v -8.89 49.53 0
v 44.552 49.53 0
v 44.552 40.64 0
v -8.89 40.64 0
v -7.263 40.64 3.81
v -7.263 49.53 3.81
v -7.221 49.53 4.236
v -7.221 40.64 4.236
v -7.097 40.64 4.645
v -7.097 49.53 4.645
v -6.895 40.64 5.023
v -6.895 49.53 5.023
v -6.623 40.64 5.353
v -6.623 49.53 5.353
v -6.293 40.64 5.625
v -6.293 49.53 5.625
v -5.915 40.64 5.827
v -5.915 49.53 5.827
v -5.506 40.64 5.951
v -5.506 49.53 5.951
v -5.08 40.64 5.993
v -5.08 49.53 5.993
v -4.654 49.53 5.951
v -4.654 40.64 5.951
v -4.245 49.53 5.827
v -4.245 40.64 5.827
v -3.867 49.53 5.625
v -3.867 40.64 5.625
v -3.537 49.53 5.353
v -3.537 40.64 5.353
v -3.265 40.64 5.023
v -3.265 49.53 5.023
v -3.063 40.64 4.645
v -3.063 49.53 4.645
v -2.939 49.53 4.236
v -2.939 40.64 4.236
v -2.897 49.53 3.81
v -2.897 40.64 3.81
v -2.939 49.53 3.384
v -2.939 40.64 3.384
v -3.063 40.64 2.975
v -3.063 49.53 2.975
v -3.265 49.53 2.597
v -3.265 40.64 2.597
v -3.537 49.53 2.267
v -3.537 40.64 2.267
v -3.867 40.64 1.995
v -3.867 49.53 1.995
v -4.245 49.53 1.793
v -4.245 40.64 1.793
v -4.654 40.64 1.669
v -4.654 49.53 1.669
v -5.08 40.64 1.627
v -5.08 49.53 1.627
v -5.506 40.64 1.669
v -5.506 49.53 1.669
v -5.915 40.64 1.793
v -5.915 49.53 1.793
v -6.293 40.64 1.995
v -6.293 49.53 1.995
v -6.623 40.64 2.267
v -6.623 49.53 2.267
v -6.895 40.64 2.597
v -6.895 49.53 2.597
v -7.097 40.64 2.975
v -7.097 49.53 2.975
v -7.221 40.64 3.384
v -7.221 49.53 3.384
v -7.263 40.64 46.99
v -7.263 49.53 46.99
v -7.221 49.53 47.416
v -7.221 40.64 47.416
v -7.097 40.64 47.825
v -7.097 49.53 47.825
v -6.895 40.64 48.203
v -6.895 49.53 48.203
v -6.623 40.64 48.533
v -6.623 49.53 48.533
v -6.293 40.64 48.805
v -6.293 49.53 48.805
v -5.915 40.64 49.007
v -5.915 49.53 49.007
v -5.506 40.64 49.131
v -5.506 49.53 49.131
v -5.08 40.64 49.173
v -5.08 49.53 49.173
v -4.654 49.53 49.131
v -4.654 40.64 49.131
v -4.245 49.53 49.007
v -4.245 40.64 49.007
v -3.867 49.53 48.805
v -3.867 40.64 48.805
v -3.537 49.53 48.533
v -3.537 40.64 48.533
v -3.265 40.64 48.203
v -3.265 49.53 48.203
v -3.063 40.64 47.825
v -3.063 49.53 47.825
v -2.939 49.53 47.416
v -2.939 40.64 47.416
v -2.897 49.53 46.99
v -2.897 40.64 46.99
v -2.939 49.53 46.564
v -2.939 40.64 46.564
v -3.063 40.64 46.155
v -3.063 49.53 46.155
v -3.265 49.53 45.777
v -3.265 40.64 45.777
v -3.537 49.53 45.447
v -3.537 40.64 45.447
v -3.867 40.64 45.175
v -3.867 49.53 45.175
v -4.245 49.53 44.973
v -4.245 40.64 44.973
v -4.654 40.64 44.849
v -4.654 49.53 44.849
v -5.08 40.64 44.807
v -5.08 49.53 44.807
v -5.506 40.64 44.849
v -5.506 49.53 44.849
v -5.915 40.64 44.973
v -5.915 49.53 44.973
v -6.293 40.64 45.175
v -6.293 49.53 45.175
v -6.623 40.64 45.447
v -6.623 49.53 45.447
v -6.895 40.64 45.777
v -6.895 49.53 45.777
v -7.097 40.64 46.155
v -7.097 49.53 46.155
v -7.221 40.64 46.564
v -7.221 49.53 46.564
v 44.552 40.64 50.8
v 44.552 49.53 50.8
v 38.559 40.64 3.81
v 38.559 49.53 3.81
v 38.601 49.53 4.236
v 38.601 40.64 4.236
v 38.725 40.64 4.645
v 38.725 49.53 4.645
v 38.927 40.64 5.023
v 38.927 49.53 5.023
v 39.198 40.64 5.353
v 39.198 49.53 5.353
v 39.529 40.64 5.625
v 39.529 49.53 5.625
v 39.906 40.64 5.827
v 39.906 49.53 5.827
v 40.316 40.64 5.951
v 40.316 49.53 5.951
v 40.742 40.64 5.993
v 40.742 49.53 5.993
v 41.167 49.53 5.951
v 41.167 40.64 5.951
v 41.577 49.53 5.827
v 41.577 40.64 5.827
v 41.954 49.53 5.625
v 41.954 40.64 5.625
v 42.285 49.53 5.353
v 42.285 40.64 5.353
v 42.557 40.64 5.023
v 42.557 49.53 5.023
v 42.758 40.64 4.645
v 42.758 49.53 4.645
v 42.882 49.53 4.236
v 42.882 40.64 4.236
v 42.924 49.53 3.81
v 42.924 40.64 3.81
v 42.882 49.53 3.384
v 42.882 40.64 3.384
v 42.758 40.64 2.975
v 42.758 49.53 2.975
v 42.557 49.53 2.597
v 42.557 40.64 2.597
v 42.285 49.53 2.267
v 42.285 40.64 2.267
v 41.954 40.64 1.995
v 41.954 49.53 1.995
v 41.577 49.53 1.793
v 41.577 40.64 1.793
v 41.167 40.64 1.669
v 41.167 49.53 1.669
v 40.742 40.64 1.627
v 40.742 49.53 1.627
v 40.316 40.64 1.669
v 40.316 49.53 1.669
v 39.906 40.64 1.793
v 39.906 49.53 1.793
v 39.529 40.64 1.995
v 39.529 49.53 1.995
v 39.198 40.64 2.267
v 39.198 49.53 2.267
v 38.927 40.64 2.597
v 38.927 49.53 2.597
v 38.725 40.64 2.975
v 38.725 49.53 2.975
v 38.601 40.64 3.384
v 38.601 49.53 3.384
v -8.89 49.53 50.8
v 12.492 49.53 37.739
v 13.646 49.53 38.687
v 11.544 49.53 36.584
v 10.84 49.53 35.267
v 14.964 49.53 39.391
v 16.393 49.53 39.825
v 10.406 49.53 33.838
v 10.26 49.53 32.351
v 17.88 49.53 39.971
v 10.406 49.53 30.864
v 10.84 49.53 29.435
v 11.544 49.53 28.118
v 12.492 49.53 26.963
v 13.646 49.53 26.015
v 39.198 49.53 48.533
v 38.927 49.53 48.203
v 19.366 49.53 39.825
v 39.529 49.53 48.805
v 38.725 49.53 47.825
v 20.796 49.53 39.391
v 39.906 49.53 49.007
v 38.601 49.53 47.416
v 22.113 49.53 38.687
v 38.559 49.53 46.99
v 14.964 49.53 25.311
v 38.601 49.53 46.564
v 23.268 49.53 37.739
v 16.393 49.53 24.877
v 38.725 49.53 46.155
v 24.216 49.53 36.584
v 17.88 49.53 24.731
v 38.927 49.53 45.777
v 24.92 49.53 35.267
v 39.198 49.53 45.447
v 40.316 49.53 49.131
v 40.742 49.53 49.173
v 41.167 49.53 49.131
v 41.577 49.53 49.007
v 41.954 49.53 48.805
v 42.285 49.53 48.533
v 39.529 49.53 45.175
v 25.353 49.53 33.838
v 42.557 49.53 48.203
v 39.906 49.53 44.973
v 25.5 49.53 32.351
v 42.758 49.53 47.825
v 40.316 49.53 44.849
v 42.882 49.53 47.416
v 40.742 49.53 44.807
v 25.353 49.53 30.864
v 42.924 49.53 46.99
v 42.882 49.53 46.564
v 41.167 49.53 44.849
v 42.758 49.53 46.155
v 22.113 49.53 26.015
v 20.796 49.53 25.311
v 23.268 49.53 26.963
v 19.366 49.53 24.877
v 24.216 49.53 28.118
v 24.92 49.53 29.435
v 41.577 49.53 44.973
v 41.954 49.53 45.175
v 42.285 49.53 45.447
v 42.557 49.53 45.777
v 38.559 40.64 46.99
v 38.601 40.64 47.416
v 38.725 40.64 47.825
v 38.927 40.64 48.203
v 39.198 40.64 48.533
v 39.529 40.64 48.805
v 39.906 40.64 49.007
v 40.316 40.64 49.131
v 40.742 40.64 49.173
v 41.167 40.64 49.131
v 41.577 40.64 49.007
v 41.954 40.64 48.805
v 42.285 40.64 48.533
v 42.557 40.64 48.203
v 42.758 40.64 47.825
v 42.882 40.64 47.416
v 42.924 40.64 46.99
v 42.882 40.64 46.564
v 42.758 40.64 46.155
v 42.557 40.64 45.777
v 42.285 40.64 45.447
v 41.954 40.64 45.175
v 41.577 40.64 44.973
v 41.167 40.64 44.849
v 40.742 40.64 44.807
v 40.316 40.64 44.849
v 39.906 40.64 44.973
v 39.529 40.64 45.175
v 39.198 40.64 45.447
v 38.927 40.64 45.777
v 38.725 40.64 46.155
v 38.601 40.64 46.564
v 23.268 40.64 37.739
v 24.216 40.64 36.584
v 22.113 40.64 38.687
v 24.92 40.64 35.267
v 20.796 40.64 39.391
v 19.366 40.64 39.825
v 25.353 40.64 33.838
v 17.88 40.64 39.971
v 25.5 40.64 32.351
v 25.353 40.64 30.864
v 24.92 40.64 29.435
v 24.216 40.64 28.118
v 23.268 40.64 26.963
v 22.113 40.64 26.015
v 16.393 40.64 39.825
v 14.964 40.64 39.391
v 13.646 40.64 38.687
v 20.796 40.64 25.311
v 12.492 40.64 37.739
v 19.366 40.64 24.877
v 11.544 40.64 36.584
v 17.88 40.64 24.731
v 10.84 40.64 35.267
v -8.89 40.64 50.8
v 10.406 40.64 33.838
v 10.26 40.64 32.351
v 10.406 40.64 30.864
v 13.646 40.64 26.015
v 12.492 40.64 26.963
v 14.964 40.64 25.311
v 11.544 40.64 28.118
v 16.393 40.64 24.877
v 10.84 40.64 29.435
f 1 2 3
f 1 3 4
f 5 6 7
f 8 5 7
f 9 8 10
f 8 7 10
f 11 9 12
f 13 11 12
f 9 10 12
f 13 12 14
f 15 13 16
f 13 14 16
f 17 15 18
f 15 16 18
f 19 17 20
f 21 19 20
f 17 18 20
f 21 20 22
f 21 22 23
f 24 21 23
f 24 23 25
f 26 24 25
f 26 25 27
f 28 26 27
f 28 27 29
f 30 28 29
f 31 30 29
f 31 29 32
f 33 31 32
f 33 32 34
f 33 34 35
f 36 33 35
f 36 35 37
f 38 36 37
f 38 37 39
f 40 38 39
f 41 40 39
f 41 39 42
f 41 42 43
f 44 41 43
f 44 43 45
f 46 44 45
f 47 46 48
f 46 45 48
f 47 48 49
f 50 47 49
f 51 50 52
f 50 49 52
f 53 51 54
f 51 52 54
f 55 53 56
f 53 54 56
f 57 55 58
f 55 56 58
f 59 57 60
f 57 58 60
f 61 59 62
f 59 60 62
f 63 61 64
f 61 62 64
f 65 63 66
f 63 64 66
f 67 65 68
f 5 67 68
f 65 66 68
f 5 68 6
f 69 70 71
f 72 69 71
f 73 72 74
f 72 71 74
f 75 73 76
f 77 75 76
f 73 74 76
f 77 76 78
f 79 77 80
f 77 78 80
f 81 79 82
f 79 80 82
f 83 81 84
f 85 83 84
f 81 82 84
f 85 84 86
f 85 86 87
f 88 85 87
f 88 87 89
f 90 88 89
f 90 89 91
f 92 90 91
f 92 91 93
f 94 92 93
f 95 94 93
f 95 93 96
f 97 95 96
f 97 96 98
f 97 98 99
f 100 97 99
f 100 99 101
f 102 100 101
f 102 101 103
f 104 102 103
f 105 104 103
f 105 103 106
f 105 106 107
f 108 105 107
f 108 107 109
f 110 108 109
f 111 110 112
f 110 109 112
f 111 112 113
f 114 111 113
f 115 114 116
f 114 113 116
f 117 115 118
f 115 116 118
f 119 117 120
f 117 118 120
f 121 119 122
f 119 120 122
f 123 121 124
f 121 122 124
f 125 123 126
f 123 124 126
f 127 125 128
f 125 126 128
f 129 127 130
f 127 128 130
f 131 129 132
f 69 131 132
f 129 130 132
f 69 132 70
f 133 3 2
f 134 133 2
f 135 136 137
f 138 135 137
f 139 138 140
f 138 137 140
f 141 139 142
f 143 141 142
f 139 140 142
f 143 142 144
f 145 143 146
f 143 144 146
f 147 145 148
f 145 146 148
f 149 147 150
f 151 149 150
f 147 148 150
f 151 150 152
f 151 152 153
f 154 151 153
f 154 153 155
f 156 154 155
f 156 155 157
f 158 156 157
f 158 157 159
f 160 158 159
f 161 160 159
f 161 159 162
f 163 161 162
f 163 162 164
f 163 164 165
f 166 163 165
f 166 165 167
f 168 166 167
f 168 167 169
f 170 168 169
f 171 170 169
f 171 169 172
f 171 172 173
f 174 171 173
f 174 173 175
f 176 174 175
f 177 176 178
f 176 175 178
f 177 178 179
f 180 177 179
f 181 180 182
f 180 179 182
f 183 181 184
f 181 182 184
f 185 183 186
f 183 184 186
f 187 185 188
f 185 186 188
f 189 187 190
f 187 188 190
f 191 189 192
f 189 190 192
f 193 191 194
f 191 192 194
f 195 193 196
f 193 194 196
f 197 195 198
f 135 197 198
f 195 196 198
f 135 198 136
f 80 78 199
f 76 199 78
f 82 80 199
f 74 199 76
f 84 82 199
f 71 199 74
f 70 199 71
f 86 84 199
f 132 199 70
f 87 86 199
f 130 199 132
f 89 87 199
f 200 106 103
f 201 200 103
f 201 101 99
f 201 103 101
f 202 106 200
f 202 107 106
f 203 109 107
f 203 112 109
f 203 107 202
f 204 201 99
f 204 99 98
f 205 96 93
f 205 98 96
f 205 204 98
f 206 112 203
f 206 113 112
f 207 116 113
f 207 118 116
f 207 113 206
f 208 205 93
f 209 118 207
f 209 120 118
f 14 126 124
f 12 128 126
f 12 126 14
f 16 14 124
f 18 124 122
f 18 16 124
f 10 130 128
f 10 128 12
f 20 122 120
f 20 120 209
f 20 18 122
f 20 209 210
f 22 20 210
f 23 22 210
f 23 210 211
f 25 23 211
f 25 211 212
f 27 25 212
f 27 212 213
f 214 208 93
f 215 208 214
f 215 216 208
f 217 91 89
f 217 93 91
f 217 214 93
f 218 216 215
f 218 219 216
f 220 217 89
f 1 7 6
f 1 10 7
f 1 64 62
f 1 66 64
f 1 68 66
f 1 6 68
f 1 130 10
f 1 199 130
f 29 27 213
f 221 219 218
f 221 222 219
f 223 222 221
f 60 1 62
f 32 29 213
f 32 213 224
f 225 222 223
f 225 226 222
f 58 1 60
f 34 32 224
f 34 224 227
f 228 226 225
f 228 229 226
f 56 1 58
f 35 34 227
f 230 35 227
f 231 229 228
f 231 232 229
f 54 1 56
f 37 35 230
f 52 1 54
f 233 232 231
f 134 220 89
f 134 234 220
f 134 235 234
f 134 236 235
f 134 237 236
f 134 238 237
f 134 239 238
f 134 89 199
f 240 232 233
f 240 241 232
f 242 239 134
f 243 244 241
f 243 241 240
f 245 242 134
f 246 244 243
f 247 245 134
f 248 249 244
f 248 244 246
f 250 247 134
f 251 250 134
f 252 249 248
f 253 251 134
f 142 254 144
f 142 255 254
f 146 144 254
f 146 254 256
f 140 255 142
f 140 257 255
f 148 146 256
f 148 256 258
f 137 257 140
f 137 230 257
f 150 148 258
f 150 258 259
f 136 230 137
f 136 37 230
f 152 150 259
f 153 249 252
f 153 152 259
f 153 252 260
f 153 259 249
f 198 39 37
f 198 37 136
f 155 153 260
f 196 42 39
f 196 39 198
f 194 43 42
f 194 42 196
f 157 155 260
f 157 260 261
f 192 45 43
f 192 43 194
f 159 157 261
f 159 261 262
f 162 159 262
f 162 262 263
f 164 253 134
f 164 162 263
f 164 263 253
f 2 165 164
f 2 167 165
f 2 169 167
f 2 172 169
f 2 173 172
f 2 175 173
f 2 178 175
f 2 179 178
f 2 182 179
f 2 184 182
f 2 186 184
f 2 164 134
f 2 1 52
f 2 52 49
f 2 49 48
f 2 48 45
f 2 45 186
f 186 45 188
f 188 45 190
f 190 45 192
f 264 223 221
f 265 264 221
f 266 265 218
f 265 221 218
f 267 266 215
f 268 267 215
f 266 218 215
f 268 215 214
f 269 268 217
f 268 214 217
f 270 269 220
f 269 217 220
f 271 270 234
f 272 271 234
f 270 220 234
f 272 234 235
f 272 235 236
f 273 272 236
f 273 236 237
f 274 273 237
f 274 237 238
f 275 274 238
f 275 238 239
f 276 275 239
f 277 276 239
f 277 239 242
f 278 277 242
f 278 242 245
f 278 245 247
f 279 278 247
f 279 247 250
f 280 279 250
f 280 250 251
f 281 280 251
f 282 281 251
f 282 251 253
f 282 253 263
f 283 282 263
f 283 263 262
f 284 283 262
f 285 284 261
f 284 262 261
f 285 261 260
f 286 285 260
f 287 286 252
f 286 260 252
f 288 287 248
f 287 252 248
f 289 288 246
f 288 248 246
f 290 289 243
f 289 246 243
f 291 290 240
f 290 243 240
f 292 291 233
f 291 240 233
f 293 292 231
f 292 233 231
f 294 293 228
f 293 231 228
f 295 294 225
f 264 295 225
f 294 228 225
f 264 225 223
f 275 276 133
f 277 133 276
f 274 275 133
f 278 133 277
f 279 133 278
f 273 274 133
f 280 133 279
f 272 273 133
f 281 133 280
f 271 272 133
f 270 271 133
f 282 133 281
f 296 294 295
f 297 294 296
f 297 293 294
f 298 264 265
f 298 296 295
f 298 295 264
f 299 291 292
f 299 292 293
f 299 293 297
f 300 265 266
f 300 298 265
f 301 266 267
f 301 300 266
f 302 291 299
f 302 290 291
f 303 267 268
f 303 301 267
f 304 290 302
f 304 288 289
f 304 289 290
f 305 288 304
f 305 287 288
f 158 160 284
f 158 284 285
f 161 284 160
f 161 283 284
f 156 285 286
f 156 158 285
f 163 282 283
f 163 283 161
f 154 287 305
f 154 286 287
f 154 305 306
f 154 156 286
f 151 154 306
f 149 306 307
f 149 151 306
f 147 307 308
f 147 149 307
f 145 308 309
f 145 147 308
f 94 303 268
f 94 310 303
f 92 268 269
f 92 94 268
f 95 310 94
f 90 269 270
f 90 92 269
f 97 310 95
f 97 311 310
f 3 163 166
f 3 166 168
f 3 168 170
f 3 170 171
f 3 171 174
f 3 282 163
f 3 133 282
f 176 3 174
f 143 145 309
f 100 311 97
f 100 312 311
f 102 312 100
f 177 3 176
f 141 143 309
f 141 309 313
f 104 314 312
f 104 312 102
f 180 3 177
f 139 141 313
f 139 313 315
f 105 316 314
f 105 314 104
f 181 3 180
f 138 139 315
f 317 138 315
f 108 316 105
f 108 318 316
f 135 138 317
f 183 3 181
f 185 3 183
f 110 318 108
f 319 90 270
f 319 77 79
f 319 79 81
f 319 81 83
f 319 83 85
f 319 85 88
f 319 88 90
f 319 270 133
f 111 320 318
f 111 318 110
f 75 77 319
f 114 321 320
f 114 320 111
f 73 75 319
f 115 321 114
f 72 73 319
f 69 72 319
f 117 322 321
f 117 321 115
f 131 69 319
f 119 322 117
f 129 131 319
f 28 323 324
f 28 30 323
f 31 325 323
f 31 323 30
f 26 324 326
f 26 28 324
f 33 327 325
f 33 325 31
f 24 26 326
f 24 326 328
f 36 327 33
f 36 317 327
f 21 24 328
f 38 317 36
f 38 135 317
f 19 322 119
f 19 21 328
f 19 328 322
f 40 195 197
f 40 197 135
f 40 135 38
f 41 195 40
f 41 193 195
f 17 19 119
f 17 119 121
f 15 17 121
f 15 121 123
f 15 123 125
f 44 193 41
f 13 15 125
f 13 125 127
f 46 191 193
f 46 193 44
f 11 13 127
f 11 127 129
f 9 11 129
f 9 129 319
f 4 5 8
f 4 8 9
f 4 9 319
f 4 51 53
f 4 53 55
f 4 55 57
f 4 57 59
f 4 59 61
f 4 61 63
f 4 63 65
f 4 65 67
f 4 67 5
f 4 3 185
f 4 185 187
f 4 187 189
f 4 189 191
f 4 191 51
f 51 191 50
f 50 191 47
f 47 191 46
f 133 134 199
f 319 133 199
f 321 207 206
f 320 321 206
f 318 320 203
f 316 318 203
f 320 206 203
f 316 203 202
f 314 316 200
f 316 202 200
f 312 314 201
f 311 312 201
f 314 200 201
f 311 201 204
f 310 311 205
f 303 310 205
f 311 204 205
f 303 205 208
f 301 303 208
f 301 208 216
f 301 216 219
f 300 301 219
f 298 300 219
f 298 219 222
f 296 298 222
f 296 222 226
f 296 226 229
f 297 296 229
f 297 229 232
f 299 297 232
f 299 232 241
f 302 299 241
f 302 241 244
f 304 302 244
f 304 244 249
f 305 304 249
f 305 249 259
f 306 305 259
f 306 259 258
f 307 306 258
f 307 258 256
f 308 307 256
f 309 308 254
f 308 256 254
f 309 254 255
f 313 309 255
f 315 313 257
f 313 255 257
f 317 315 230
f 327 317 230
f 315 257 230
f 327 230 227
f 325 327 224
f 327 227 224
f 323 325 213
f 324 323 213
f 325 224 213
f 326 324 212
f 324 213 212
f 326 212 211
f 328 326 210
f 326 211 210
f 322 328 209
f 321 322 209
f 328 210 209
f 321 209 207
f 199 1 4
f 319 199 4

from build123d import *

# Parameters (mm, degrees)
BOSS_EXTRUDE1_DEPTH = 50.8
CUT_EXTRUDE1_REACH  = 70.151
SKETCH2_R           = 7.62
SKETCH3_R           = 2.1828125
CUT_EXTRUDE2_DEPTH  = 69.150694513


with BuildPart() as part:
    # Sketch1 → Boss-Extrude1 (new body)
    with BuildSketch(Plane.XY):
        Polygon((-8.89, 40.64), (-8.89, 46.99), (-8.89, 49.53), (44.5516, 49.53), (44.5516, 46.99), (44.5516, 40.64), align=None)
    extrude(amount=BOSS_EXTRUDE1_DEPTH)

    # Sketch2 → Cut-Extrude1 (cut, up to next)
    with BuildSketch(Plane(origin=(0, 49.53, 0), x_dir=(1, 0, 0), z_dir=(0, 1, 0)), mode=Mode.PRIVATE) as cut_extrude1_sk1:
        with Locations(Location((17.8798, -32.350999872, 0), (0, 0, 180))):
            Circle(SKETCH2_R)
    cut_extrude1_tool1 = extrude(cut_extrude1_sk1.sketch, amount=-CUT_EXTRUDE1_REACH, mode=Mode.PRIVATE) & part.part
    add(cut_extrude1_tool1.solids().sort_by_distance((17.8798, 49.53, 32.351))[0], mode=Mode.SUBTRACT)

    # Sketch3 → Cut-Extrude2 (cut, through all)
    with BuildSketch(Plane(origin=(0, 49.53, 0), x_dir=(1, 0, 0), z_dir=(0, 1, 0))):
        with Locations(Location((40.7416, -46.99, 0), (0, 0, 180))):
            Circle(SKETCH3_R)
        with Locations(Location((-5.08, -46.99, 0), (0, 0, 180))):
            Circle(SKETCH3_R)
        with Locations(Location((-5.08, -3.81, 0), (0, 0, 180))):
            Circle(SKETCH3_R)
        with Locations(Location((40.7416, -3.81, 0), (0, 0, 180))):
            Circle(SKETCH3_R)
    extrude(amount=-CUT_EXTRUDE2_DEPTH, mode=Mode.SUBTRACT)


solid = part.part
